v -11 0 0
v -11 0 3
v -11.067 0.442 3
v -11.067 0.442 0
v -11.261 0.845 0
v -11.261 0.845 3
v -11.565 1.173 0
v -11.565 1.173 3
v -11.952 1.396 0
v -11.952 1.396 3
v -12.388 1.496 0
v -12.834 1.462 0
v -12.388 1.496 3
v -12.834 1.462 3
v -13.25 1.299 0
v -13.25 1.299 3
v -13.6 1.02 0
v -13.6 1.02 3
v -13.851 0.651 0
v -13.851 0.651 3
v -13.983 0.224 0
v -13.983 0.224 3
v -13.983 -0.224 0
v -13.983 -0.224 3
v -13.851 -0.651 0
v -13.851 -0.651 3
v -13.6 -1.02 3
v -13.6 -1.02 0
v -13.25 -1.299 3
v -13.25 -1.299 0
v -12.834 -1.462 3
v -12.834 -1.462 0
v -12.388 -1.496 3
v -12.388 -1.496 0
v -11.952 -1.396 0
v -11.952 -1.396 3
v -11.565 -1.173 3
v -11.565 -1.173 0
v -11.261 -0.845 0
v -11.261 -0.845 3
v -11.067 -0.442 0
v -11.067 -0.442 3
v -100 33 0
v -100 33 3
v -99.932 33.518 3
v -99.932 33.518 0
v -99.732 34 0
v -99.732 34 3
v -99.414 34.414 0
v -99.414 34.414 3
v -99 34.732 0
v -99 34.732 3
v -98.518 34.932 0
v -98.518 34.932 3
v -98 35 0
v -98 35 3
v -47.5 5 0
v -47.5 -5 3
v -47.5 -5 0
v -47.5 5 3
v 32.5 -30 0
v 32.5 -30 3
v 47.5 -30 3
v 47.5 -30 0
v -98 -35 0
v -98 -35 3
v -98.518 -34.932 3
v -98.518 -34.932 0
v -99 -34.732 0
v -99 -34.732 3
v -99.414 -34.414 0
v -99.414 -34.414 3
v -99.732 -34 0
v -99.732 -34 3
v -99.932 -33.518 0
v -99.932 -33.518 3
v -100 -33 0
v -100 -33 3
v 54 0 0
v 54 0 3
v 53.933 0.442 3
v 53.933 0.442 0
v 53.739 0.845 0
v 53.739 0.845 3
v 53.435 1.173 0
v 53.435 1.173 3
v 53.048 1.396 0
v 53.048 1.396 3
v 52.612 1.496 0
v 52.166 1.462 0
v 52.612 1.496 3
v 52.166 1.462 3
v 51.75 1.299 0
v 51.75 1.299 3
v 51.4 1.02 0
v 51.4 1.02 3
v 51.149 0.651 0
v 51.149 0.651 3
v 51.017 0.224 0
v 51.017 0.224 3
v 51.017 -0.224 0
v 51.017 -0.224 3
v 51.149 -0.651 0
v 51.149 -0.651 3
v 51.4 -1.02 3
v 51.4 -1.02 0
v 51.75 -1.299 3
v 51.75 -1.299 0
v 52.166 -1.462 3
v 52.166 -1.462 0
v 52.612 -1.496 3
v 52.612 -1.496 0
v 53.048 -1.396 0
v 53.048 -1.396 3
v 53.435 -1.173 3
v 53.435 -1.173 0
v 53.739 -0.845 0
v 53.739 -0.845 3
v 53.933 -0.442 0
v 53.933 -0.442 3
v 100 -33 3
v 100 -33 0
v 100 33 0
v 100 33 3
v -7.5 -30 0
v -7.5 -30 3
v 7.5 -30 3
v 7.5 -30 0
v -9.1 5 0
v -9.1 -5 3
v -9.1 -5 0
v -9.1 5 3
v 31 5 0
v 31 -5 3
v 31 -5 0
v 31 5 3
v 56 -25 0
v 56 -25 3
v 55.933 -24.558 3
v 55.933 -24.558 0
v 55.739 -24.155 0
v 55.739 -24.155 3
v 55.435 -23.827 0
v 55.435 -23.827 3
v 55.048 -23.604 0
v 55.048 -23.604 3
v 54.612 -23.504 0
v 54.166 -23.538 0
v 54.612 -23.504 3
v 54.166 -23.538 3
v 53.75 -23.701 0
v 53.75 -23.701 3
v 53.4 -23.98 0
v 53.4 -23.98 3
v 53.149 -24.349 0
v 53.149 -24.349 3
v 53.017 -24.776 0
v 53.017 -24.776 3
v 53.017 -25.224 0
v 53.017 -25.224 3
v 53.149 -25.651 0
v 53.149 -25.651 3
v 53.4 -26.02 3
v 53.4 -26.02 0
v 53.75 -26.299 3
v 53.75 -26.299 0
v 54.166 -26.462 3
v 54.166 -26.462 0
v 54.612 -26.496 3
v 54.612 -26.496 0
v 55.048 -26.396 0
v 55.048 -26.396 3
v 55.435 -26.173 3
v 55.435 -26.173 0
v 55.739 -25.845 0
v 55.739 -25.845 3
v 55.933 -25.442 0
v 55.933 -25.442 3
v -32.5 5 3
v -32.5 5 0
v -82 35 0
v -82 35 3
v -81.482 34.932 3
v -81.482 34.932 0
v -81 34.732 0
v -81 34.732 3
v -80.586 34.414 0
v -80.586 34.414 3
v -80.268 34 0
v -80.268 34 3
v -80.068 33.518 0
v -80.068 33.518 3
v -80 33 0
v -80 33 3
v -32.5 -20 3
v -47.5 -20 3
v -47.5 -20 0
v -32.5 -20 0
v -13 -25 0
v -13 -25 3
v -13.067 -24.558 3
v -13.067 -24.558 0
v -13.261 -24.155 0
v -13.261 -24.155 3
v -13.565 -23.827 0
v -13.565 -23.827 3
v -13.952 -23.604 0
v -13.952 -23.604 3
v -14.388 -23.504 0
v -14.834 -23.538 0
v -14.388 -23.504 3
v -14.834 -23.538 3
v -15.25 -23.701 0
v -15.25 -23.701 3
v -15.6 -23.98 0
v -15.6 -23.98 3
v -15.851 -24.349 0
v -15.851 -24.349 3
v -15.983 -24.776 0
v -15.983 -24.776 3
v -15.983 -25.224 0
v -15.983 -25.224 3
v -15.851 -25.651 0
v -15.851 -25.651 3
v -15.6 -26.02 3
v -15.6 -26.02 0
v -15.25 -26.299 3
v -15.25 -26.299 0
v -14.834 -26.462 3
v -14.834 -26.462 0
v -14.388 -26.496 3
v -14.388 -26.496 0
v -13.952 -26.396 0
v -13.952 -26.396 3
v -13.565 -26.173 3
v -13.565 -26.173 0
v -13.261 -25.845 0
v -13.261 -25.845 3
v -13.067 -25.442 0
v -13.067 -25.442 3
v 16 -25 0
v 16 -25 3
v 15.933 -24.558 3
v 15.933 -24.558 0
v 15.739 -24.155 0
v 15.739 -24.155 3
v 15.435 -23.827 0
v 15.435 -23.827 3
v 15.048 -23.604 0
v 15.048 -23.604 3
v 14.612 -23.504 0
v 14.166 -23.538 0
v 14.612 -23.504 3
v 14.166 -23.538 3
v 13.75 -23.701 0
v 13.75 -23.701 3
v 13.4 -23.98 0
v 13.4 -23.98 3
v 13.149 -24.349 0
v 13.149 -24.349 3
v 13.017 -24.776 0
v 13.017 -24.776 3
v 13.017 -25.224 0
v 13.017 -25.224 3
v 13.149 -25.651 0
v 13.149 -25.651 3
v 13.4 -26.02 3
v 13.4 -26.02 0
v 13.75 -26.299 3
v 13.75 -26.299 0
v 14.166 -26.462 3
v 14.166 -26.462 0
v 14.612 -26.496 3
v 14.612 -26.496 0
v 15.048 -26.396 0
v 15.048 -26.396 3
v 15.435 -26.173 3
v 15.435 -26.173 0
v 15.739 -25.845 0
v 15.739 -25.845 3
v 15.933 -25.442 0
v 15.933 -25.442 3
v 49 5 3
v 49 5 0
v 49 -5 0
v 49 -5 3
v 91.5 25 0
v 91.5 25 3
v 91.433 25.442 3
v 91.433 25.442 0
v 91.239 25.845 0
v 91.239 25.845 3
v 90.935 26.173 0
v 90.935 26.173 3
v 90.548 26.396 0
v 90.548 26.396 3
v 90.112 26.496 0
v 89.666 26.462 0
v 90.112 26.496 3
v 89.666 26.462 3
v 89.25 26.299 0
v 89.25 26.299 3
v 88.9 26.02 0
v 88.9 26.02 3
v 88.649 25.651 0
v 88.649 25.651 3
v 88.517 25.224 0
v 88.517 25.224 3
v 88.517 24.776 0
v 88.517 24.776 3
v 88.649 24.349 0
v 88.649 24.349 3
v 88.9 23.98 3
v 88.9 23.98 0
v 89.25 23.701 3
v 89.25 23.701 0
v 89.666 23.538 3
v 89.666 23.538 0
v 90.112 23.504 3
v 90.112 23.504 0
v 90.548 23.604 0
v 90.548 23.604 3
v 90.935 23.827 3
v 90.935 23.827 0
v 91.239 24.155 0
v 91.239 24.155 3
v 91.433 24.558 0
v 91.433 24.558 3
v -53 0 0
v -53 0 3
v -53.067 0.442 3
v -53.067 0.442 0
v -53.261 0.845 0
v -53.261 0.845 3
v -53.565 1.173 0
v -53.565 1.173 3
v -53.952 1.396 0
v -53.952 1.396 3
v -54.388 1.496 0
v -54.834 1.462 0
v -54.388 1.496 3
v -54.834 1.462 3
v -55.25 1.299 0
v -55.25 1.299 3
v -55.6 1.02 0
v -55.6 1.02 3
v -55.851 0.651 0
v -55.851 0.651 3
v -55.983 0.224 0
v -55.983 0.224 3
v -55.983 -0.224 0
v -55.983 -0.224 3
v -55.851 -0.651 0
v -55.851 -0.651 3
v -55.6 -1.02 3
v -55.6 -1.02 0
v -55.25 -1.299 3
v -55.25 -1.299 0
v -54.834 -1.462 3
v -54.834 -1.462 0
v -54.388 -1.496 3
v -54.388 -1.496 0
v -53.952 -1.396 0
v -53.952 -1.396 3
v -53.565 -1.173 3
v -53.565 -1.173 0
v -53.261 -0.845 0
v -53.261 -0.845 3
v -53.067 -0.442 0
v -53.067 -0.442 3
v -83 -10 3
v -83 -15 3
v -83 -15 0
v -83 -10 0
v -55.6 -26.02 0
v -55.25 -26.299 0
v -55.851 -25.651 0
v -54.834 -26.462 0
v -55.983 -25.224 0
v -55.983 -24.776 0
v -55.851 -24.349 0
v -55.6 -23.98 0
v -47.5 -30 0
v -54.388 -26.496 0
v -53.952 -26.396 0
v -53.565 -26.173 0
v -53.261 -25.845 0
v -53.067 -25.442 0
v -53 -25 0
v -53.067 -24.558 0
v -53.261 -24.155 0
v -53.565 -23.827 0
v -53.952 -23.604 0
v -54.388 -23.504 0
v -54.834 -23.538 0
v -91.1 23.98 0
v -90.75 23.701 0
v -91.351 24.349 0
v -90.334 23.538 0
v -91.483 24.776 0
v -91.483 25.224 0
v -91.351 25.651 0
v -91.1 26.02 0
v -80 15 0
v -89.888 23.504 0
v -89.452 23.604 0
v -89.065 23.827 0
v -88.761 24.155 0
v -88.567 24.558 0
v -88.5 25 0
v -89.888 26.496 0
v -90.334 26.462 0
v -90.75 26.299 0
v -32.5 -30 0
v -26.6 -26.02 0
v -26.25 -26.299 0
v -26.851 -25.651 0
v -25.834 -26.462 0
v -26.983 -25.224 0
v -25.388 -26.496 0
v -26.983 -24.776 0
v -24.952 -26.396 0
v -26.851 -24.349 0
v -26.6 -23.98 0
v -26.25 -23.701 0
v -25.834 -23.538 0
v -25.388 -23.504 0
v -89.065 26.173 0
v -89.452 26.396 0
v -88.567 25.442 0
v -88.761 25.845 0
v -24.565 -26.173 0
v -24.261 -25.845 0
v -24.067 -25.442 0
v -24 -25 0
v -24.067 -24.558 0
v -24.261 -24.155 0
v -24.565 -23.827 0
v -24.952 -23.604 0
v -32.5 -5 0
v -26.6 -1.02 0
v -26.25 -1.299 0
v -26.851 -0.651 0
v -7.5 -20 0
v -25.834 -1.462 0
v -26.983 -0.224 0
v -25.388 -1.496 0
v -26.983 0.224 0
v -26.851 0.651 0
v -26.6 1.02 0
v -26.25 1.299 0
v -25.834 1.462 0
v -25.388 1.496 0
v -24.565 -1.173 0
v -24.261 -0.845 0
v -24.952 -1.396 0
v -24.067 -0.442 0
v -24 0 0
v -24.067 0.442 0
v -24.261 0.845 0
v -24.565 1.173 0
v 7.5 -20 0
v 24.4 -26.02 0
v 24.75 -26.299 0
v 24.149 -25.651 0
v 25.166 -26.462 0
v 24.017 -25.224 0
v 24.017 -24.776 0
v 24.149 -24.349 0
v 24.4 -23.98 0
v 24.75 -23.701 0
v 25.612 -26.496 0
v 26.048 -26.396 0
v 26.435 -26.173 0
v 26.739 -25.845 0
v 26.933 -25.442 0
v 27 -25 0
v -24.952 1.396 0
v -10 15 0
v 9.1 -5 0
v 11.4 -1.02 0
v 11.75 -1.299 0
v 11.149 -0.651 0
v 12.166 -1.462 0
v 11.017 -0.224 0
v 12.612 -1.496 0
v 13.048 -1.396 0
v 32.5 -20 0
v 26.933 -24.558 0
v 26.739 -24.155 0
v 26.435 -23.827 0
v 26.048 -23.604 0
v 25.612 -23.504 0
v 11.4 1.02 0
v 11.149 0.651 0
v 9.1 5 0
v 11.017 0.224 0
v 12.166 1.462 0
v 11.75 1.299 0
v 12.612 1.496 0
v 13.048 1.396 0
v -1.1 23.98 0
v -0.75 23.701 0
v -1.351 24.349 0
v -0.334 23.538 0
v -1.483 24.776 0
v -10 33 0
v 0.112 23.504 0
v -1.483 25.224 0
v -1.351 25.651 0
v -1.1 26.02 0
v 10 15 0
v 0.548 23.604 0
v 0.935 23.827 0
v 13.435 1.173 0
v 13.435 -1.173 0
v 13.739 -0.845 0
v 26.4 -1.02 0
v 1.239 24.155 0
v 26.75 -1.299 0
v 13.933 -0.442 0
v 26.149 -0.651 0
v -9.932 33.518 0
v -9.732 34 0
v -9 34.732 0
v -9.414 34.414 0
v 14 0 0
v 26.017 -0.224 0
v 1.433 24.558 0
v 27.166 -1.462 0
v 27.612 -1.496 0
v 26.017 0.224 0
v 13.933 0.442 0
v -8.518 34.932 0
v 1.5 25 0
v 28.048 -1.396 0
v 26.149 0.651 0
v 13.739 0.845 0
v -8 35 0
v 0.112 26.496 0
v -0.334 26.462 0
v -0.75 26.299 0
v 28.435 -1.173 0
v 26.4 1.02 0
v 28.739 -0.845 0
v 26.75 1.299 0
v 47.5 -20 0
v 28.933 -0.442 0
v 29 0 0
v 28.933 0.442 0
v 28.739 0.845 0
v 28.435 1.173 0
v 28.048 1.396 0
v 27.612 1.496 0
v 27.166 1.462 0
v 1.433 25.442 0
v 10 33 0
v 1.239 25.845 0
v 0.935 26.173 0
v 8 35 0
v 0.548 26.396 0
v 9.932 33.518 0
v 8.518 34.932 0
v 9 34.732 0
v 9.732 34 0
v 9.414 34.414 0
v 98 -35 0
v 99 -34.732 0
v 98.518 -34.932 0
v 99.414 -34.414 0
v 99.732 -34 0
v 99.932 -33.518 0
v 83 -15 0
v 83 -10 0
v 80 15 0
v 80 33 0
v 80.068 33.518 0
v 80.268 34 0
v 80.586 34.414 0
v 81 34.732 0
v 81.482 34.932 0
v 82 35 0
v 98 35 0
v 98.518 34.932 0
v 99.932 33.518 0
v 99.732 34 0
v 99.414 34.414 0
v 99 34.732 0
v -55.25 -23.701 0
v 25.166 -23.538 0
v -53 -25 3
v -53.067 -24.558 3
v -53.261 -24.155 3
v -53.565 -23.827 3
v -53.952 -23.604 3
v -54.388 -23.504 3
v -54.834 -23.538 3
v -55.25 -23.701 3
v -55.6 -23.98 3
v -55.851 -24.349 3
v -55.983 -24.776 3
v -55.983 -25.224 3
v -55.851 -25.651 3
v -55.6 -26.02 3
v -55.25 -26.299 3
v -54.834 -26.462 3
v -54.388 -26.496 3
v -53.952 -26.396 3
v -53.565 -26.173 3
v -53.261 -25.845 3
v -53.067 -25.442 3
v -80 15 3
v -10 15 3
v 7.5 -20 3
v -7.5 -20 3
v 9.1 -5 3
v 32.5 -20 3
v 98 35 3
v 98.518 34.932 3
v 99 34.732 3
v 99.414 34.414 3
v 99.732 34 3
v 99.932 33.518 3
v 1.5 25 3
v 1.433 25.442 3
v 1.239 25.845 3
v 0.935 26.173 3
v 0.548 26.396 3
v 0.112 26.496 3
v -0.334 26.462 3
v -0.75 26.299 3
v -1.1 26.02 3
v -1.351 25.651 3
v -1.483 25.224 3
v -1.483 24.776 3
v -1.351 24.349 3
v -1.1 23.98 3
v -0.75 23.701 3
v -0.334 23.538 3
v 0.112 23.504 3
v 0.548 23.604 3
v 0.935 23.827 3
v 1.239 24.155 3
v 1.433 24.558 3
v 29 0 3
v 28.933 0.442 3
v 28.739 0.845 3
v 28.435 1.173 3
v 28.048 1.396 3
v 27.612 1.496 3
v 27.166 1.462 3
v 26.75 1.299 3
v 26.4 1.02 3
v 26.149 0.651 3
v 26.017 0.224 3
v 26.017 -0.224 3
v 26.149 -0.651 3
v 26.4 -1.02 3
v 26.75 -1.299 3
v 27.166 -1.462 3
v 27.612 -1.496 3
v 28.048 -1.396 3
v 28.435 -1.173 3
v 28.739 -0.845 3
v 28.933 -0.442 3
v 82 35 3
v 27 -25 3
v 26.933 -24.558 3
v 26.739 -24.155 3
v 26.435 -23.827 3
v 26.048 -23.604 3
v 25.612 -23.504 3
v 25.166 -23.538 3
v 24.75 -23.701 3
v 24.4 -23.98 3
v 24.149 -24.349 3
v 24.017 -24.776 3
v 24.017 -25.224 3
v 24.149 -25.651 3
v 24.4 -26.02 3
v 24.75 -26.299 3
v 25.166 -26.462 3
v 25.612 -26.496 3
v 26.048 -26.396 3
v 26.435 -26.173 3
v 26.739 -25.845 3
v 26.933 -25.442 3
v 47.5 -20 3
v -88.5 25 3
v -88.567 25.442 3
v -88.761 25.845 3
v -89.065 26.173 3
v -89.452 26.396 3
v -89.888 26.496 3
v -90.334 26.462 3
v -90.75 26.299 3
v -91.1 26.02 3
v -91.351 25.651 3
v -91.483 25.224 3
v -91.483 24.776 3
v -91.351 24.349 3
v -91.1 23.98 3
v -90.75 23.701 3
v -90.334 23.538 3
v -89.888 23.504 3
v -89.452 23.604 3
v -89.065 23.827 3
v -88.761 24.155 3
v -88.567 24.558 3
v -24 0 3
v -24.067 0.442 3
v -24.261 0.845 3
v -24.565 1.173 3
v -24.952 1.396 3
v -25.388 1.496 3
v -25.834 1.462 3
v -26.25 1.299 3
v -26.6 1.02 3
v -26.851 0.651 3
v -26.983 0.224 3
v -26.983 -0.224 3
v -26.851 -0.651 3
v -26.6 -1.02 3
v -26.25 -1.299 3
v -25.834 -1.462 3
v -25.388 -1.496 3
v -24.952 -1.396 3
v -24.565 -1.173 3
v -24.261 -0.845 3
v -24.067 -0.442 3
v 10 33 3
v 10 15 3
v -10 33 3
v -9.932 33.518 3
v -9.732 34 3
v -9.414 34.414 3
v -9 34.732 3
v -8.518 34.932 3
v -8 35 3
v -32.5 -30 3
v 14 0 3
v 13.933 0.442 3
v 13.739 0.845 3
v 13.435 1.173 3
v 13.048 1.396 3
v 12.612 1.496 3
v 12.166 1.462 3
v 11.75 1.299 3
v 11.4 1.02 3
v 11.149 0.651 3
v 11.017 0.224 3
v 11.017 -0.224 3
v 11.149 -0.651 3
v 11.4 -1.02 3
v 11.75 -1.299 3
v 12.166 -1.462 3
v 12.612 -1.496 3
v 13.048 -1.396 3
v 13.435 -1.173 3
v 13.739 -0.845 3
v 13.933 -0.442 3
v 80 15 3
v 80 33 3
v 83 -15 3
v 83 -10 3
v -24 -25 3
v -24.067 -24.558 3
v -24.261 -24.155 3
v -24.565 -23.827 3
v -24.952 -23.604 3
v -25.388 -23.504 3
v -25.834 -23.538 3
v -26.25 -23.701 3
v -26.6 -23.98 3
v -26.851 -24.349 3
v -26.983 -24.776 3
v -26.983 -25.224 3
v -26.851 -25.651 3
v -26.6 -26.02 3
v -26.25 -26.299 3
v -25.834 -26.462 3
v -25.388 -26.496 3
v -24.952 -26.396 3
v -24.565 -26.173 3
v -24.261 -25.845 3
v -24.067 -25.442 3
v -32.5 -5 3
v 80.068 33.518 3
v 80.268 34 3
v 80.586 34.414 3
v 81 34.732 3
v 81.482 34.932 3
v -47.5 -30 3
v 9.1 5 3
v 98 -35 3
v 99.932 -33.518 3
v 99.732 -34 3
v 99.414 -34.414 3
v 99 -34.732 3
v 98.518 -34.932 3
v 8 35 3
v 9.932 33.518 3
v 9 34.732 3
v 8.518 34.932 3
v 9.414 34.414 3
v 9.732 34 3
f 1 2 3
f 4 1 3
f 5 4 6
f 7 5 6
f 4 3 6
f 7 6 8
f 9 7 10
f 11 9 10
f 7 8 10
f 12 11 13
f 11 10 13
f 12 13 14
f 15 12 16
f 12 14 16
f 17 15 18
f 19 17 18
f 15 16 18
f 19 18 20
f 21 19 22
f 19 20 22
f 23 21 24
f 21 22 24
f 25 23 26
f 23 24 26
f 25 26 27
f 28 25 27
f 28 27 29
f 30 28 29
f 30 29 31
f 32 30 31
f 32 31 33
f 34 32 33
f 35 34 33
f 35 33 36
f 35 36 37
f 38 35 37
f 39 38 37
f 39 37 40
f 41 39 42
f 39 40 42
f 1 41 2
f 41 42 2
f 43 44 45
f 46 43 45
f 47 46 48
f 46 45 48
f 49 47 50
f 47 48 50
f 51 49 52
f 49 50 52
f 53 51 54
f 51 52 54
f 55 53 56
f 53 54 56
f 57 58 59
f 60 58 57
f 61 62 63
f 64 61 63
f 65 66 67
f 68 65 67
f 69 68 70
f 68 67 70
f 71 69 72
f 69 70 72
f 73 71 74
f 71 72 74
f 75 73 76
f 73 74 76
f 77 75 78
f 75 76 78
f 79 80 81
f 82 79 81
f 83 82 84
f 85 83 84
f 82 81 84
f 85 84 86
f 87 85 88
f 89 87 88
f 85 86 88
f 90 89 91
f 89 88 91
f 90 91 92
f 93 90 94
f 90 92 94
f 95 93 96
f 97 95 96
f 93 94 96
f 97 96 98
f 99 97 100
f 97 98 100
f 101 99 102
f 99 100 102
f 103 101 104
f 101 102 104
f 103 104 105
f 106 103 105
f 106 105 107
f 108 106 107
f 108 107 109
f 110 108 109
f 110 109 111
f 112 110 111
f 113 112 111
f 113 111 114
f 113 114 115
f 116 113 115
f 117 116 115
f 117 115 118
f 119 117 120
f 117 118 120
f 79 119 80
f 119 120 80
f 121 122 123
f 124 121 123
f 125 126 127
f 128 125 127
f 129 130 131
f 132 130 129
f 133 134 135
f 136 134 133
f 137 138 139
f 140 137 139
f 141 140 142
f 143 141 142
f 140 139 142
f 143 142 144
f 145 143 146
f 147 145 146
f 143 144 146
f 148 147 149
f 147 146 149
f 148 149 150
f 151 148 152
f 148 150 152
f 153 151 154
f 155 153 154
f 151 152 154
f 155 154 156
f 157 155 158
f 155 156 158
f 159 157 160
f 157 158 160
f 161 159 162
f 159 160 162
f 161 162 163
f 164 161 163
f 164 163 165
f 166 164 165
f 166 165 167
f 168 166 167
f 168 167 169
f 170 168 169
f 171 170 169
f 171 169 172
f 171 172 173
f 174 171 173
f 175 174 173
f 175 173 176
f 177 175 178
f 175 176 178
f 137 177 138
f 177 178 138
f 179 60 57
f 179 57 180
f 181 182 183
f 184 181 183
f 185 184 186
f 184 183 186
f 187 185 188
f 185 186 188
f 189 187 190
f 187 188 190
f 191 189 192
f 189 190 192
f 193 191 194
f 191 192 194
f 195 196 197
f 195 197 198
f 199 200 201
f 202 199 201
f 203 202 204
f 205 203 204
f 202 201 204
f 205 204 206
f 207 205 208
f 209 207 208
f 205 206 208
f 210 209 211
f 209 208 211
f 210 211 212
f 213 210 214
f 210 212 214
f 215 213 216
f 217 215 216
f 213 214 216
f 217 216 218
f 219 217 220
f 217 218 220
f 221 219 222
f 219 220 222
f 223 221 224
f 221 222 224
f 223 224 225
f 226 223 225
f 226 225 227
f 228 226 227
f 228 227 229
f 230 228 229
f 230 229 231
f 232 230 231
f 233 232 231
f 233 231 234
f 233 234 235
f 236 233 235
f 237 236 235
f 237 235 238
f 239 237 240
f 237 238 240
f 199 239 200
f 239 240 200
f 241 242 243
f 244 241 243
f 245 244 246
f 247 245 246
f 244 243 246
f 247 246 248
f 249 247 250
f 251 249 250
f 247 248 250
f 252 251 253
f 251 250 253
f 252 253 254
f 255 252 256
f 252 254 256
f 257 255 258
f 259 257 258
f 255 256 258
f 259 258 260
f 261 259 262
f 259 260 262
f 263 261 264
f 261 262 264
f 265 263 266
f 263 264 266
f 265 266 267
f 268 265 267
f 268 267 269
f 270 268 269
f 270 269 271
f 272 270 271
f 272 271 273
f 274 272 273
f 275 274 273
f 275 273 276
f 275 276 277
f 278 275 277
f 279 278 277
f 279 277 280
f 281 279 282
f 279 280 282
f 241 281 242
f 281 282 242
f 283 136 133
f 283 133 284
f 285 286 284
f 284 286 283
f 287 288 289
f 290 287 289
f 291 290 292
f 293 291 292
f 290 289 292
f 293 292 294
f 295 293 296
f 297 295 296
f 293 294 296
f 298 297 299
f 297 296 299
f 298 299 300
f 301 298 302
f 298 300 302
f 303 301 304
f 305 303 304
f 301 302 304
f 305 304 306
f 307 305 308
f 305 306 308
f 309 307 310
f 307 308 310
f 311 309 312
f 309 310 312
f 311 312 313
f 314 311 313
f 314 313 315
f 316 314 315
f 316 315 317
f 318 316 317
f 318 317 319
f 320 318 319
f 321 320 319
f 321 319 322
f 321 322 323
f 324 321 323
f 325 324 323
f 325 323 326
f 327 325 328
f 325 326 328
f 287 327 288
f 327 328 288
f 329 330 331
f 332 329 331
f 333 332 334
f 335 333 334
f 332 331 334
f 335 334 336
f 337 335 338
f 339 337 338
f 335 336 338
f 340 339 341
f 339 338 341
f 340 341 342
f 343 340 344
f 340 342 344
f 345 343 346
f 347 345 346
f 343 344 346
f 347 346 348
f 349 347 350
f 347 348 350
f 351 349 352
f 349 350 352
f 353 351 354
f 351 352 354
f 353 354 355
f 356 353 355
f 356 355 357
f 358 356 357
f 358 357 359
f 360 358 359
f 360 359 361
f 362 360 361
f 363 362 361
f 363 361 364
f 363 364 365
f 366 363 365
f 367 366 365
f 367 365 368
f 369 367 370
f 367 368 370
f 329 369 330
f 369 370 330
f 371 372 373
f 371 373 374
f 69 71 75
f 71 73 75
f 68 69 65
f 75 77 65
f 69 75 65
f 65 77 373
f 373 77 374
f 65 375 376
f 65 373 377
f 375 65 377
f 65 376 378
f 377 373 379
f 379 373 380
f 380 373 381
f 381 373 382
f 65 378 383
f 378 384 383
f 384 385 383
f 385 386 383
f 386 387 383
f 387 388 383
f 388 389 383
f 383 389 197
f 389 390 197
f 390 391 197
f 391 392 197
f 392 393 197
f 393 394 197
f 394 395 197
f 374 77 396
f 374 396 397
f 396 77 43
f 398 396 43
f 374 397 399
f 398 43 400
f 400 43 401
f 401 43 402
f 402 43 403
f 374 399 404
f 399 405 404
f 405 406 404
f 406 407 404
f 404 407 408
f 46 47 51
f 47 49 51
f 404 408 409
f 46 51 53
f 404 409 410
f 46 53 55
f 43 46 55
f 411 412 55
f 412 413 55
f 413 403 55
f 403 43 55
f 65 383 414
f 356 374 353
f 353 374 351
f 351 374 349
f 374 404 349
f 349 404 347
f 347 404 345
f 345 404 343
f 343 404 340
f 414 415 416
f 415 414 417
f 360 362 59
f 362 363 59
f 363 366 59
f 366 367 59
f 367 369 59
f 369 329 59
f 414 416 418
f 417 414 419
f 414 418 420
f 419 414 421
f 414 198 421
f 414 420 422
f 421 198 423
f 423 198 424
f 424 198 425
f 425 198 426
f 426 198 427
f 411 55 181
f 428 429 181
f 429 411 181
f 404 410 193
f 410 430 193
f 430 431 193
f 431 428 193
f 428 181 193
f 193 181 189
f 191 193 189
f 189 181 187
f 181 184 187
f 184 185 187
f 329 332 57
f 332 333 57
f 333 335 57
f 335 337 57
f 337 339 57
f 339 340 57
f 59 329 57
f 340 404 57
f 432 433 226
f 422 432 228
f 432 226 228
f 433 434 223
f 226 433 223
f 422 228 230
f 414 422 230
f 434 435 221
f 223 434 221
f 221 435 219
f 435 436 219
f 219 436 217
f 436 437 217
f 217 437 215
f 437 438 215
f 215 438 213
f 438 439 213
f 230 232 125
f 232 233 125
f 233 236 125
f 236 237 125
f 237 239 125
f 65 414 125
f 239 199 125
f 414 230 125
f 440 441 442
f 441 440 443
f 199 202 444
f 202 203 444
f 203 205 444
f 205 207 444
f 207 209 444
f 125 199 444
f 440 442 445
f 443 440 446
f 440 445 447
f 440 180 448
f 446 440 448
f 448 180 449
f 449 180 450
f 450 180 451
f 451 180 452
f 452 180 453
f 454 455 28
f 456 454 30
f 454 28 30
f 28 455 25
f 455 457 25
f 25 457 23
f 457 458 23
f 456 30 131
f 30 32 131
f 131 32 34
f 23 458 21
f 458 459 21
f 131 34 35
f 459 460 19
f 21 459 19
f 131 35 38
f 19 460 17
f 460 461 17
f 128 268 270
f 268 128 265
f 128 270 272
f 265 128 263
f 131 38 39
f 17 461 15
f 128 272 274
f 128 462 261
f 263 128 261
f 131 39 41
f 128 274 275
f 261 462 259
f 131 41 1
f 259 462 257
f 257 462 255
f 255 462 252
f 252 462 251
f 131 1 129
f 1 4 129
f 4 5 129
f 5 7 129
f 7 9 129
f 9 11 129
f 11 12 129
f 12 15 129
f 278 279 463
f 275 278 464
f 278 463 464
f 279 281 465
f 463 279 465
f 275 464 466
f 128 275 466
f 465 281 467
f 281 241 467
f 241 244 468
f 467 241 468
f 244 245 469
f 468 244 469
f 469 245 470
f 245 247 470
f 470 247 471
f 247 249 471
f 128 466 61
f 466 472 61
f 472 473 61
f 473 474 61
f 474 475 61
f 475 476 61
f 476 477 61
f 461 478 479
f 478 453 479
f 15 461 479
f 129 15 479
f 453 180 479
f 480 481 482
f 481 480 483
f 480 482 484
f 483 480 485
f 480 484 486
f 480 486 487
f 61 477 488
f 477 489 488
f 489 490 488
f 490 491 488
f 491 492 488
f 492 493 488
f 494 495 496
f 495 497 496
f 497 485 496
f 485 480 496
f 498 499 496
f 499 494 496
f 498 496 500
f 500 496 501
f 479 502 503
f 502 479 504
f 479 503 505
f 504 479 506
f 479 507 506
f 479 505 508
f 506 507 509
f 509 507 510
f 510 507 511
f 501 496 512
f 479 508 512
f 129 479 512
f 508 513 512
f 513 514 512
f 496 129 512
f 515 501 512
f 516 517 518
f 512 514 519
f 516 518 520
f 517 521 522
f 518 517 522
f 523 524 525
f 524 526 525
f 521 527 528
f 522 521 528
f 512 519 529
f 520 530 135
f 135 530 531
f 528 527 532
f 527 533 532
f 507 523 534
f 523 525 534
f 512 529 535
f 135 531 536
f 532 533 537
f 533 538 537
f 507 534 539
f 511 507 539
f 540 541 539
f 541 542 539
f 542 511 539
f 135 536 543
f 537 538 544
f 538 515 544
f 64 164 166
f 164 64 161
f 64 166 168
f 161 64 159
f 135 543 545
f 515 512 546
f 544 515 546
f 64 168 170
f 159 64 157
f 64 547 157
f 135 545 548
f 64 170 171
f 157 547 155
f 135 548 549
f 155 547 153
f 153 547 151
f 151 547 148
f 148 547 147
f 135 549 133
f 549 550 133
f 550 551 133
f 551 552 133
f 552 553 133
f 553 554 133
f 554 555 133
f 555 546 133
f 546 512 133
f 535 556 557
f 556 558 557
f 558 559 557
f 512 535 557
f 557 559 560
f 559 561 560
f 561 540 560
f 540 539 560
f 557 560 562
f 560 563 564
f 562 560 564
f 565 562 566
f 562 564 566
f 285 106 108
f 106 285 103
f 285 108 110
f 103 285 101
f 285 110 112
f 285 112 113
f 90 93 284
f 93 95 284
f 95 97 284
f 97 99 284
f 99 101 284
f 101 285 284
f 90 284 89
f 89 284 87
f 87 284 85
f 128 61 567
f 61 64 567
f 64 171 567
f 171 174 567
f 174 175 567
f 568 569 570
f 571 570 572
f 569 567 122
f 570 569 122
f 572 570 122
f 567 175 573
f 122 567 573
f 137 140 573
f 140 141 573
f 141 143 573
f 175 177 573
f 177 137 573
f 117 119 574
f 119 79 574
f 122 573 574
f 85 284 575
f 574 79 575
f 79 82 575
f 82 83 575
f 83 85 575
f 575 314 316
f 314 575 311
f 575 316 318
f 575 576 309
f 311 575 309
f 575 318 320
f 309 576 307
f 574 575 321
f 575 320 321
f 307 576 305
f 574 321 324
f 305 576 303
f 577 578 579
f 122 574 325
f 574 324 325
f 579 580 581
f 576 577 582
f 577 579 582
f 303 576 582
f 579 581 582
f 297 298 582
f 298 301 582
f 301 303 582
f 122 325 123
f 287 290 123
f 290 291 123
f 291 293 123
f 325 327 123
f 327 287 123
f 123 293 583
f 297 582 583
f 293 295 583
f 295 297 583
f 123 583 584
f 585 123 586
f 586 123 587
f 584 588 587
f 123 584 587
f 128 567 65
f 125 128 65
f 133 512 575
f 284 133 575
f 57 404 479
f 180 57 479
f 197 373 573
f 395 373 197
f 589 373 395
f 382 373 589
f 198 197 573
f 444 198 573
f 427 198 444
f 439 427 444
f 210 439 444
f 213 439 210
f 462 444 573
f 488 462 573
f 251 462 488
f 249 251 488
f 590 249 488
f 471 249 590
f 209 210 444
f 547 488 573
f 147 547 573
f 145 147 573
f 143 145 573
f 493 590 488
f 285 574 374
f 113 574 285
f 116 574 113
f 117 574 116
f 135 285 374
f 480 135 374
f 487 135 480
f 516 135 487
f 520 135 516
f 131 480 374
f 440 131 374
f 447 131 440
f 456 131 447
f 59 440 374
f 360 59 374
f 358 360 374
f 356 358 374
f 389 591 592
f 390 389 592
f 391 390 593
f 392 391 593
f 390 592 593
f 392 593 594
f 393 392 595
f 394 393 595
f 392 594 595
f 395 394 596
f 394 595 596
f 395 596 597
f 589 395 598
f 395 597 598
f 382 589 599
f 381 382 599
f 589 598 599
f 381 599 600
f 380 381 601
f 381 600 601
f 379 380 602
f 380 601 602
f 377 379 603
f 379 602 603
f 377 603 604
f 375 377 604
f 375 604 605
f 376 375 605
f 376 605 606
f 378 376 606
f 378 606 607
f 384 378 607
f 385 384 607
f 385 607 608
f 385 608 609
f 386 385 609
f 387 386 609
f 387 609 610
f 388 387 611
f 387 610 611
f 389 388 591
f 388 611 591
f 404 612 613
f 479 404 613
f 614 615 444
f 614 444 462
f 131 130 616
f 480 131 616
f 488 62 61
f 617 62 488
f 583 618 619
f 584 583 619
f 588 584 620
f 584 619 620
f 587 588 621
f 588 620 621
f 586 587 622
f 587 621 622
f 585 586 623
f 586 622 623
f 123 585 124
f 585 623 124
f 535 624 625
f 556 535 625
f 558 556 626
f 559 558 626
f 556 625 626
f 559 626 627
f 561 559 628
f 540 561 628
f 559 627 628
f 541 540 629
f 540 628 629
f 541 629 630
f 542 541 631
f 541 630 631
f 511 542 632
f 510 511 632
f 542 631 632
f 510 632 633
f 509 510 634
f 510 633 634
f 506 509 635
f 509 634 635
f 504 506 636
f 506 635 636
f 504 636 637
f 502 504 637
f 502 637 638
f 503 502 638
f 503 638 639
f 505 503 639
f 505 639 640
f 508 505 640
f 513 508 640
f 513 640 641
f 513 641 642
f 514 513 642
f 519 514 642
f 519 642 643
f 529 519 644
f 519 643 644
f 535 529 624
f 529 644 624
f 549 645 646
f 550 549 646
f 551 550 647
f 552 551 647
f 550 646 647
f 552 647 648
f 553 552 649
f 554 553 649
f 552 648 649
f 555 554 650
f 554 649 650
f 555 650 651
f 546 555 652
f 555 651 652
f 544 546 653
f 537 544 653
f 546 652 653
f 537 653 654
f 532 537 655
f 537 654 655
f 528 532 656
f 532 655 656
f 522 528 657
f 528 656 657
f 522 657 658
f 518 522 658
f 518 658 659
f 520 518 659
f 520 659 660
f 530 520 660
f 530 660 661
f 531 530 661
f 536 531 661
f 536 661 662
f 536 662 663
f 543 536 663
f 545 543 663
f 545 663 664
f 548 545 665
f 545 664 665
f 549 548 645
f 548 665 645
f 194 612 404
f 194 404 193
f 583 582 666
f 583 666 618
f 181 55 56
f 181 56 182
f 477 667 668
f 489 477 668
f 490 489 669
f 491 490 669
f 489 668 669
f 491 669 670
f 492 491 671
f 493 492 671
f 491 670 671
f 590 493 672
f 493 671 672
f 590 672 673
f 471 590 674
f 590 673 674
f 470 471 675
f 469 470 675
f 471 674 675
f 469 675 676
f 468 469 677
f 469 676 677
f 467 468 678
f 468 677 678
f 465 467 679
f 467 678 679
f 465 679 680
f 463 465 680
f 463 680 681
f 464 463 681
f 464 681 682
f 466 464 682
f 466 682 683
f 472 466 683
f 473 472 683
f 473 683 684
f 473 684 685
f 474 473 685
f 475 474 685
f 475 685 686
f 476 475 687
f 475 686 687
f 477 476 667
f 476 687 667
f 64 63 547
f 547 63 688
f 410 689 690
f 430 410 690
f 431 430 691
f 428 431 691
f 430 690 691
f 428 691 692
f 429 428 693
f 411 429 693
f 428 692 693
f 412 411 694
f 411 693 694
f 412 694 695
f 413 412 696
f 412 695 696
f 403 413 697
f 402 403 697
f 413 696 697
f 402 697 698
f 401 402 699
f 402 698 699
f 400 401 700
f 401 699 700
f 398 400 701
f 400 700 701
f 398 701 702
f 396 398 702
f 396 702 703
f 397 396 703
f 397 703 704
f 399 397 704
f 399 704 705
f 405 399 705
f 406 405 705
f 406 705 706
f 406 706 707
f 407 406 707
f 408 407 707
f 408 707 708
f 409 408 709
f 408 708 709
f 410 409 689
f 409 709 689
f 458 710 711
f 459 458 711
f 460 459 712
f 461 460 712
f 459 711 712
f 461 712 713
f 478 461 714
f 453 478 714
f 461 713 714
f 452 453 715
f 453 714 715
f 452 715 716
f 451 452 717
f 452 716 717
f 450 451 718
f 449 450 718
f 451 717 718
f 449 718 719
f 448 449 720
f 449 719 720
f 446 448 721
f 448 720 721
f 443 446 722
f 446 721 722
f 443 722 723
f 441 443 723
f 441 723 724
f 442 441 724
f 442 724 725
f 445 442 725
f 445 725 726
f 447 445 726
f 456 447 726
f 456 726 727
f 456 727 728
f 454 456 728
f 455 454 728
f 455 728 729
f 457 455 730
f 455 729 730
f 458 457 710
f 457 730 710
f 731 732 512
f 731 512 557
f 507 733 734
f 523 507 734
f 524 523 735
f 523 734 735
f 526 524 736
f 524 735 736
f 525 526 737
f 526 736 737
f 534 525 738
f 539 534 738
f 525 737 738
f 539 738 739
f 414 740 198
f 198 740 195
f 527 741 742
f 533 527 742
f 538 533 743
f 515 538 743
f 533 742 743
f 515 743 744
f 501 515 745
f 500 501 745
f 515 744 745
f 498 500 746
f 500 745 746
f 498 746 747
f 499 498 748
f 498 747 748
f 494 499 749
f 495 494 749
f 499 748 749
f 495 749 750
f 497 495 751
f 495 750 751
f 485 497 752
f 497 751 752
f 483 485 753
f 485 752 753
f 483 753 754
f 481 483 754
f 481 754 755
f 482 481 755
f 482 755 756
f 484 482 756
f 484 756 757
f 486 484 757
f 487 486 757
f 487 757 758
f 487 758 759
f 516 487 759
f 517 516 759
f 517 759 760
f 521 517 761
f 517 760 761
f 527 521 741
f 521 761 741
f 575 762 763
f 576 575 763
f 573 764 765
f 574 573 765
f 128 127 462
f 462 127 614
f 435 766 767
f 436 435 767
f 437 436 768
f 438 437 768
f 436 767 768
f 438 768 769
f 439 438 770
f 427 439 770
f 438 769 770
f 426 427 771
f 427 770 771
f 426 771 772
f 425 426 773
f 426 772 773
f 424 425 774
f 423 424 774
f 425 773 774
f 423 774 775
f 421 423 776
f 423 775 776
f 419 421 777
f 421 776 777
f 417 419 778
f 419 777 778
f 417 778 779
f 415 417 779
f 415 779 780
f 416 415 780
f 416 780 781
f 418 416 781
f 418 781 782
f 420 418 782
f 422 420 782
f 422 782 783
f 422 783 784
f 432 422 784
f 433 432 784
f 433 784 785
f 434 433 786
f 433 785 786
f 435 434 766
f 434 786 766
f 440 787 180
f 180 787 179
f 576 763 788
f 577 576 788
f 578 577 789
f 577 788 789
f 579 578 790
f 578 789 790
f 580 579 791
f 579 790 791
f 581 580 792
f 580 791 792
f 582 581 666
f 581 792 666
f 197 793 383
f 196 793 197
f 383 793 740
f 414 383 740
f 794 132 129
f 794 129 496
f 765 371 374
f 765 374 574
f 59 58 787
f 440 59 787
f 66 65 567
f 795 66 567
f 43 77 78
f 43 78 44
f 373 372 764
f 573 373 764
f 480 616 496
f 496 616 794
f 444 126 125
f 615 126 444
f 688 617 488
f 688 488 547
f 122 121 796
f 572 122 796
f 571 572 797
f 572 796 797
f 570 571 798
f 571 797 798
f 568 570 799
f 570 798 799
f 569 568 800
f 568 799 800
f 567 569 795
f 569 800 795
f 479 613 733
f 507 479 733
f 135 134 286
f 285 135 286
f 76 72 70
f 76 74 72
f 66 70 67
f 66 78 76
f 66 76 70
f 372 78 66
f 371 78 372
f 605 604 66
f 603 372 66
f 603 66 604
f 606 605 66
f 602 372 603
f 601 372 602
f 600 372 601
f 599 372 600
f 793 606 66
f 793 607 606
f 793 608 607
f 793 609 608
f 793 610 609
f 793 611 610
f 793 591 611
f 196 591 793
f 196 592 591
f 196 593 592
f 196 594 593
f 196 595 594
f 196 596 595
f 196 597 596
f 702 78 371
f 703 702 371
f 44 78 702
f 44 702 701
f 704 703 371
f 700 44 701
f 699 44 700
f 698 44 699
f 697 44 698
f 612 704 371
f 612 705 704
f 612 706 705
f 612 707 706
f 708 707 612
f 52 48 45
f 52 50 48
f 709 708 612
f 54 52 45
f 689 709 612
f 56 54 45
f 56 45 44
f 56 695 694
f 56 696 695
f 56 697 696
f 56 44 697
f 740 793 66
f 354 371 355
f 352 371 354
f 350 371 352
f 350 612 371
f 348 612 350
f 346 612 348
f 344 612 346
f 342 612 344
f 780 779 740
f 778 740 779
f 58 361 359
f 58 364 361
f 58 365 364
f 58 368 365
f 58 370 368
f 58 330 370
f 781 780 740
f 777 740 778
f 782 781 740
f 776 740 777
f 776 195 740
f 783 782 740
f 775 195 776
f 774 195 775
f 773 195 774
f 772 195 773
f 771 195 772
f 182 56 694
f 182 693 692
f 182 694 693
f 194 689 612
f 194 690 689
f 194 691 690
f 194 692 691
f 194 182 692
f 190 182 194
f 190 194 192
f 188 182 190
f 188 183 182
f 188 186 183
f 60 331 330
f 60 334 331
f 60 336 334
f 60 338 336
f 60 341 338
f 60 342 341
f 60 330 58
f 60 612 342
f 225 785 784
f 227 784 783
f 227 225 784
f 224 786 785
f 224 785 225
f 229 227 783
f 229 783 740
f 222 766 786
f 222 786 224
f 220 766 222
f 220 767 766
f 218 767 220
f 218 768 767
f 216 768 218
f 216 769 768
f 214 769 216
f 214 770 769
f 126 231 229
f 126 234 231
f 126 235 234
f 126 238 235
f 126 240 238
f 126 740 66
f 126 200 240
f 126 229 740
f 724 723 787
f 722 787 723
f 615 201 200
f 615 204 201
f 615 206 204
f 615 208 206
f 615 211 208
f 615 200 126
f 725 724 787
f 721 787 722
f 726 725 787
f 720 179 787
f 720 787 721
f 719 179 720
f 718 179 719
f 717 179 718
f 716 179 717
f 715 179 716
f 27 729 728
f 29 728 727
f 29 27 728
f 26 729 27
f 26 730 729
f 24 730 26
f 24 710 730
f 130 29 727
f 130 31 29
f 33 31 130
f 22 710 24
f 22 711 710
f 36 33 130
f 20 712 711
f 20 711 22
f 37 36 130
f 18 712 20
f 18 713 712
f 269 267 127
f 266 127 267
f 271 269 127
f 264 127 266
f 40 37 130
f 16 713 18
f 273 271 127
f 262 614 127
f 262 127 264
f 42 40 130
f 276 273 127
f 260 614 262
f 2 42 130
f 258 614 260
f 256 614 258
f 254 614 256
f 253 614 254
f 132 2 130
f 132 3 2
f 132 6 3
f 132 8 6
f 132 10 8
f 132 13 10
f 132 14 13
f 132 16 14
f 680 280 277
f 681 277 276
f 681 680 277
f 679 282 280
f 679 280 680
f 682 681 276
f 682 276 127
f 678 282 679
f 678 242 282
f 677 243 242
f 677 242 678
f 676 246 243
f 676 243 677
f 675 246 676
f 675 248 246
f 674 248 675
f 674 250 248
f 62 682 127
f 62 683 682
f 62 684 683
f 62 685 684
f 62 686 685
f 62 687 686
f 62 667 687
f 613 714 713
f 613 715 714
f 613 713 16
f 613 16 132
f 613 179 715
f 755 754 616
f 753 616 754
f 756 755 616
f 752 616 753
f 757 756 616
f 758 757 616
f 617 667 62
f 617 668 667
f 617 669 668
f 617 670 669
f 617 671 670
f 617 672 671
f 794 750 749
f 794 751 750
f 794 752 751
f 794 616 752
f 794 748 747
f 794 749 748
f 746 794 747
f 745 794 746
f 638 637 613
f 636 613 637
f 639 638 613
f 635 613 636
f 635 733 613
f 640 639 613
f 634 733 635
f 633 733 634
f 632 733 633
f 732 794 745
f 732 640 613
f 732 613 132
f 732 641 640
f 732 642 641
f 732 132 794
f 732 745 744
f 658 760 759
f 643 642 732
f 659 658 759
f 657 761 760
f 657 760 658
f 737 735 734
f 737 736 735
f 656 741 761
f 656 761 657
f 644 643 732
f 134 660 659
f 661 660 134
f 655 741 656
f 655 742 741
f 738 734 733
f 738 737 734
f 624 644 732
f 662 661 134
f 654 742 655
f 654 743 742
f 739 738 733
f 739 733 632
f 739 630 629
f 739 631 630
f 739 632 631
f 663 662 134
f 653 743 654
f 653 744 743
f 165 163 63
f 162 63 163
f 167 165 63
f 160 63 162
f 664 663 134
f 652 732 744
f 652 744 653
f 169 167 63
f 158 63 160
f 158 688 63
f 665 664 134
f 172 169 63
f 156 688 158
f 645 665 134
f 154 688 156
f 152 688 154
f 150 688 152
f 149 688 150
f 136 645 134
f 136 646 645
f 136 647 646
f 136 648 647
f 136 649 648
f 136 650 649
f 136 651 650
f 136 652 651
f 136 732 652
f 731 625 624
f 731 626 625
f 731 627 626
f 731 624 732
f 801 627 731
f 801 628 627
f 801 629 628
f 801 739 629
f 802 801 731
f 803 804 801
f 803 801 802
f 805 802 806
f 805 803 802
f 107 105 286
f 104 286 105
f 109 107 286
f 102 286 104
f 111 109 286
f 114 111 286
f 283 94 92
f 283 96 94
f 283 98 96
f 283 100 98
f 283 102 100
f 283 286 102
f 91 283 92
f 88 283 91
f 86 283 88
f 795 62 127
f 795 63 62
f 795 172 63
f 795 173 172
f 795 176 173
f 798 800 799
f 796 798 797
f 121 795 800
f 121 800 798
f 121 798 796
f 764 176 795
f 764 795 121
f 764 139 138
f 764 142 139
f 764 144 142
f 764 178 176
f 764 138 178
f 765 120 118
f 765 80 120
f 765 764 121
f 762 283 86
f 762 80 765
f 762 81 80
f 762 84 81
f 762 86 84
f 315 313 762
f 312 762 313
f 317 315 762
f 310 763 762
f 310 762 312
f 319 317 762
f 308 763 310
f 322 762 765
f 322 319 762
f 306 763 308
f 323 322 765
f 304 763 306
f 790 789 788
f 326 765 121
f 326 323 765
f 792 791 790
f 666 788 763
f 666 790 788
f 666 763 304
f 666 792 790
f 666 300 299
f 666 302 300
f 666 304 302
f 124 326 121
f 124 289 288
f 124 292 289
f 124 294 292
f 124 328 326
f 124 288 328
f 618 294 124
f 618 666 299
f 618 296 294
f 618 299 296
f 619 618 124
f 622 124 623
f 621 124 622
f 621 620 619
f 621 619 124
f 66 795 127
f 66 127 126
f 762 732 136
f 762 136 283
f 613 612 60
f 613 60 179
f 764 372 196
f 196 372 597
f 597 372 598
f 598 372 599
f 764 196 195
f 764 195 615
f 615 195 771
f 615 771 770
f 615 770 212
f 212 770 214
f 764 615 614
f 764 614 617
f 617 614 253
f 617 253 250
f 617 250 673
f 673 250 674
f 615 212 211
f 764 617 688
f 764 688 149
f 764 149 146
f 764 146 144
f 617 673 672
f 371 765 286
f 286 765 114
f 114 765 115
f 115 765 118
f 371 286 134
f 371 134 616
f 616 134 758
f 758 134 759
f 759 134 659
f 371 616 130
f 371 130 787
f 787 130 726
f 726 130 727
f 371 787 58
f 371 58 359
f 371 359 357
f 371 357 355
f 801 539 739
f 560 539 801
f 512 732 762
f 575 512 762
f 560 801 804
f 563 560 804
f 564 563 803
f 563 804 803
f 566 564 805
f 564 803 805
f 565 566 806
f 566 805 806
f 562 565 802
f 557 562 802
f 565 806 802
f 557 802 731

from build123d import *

# Parameters (mm, degrees)
SKETCH_1_W           = 200
SKETCH_1_H           = 70
EXTRUDE_1_DEPTH      = 3
SKETCH_2_W           = 70
SKETCH_2_H           = 20
CUT_EXTRUDE_1_DEPTH  = 3
SKETCH_4_W           = 70
SKETCH_4_H           = 20
CUT_EXTRUDE_2_DEPTH  = 3
SKETCH_5_W           = 166
SKETCH_5_H           = 5
CUT_EXTRUDE_3_DEPTH  = 3
CUT_EXTRUDE_8_DEPTH  = 3
SKETCH_7_R           = 1.5
CUT_EXTRUDE_9_DEPTH  = 3
SKETCH_8_W           = 15
SKETCH_8_H           = 10
CUT_EXTRUDE_10_DEPTH = 3
SKETCH_9_W           = 15
SKETCH_9_H           = 10
SKETCH_9_W_2         = 18
SKETCH_9_W_3         = 18.2
CUT_EXTRUDE_11_DEPTH = 3
SKETCH_10_R          = 1.5
CUT_EXTRUDE_12_DEPTH = 3


with BuildPart() as part:
    # ｽｹｯﾁ1 → ﾎﾞｽ - 押し出し1 (new body)
    with BuildSketch(Plane.XY):
        Rectangle(SKETCH_1_W, SKETCH_1_H)
    extrude(amount=EXTRUDE_1_DEPTH)

    # ｽｹｯﾁ2 → ｶｯﾄ - 押し出し1 (cut)
    with BuildSketch(Plane.XY.offset(3)):
        with Locations((-45, 25)):
            Rectangle(SKETCH_2_W, SKETCH_2_H)
    extrude(amount=-CUT_EXTRUDE_1_DEPTH, mode=Mode.SUBTRACT)

    # ｽｹｯﾁ4 → ｶｯﾄ - 押し出し2 (cut)
    with BuildSketch(Plane.XY.offset(3)):
        with Locations((45, 25)):
            Rectangle(SKETCH_4_W, SKETCH_4_H)
    extrude(amount=-CUT_EXTRUDE_2_DEPTH, mode=Mode.SUBTRACT)

    # ｽｹｯﾁ5 → ｶｯﾄ - 押し出し3 (cut)
    with BuildSketch(Plane.XY.offset(3)):
        with Locations((0, -12.5)):
            Rectangle(SKETCH_5_W, SKETCH_5_H)
    extrude(amount=-CUT_EXTRUDE_3_DEPTH, mode=Mode.SUBTRACT)

    # ｽｹｯﾁ6 → ｶｯﾄ - 押し出し8 (cut)
    with BuildSketch(Plane.XY.offset(3)):
        with BuildLine():
            ThreePointArc((-98, -35), (-99.414213562, -34.414213562), (-100, -33))
            Line((-100, -33), (-100, -35))
            Line((-100, -35), (-98, -35))
        make_face()
        with BuildLine():
            Line((-100, 35), (-100, 33))
            ThreePointArc((-100, 33), (-99.414213562, 34.414213562), (-98, 35))
            Line((-98, 35), (-100, 35))
        make_face()
        with BuildLine():
            ThreePointArc((100, -33), (99.414213562, -34.414213562), (98, -35))
            Line((98, -35), (100, -35))
            Line((100, -35), (100, -33))
        make_face()
        with BuildLine():
            Line((-80, 35), (-82, 35))
            ThreePointArc((-82, 35), (-80.585786438, 34.414213562), (-80, 33))
            Line((-80, 33), (-80, 35))
        make_face()
        with BuildLine():
            ThreePointArc((98, 35), (99.414213562, 34.414213562), (100, 33))
            Line((100, 33), (100, 35))
            Line((100, 35), (98, 35))
        make_face()
        with BuildLine():
            ThreePointArc((80, 33), (80.585786438, 34.414213562), (82, 35))
            Line((82, 35), (80, 35))
            Line((80, 35), (80, 33))
        make_face()
        with BuildLine():
            Line((-10, 35), (-10, 33))
            ThreePointArc((-10, 33), (-9.414213562, 34.414213562), (-8, 35))
            Line((-8, 35), (-10, 35))
        make_face()
        with BuildLine():
            Line((10, 35), (8, 35))
            ThreePointArc((8, 35), (9.414213562, 34.414213562), (10, 33))
            Line((10, 33), (10, 35))
        make_face()
    extrude(amount=-CUT_EXTRUDE_8_DEPTH, mode=Mode.SUBTRACT)

    # ｽｹｯﾁ7 → ｶｯﾄ - 押し出し9 (cut)
    with BuildSketch(Plane.XY.offset(3)):
        with Locations((-90, 25)):
            Circle(SKETCH_7_R)
        with Locations((0, 25)):
            Circle(SKETCH_7_R)
        with Locations((90, 25)):
            Circle(SKETCH_7_R)
    extrude(amount=-CUT_EXTRUDE_9_DEPTH, mode=Mode.SUBTRACT)

    # ｽｹｯﾁ8 → ｶｯﾄ - 押し出し10 (cut)
    with BuildSketch(Plane.XY.offset(3)):
        with Locations((40, -25)):
            Rectangle(SKETCH_8_W, SKETCH_8_H)
        with Locations((0, -25)):
            Rectangle(SKETCH_8_W, SKETCH_8_H)
        with Locations((-40, -25)):
            Rectangle(SKETCH_8_W, SKETCH_8_H)
    extrude(amount=-CUT_EXTRUDE_10_DEPTH, mode=Mode.SUBTRACT)

    # ｽｹｯﾁ9 → ｶｯﾄ - 押し出し11 (cut)
    with BuildSketch(Plane.XY.offset(3)):
        with Locations((-40, 0)):
            Rectangle(SKETCH_9_W, SKETCH_9_H)
        with Locations((40, 0)):
            Rectangle(SKETCH_9_W_2, SKETCH_9_H)
        Rectangle(SKETCH_9_W_3, SKETCH_9_H)
    extrude(amount=-CUT_EXTRUDE_11_DEPTH, mode=Mode.SUBTRACT)

    # ｽｹｯﾁ10 → ｶｯﾄ - 押し出し12 (cut)
    with BuildSketch(Plane.XY.offset(3)):
        with Locations((-54.5, 0)):
            Circle(SKETCH_10_R)
        with Locations((-25.5, 0)):
            Circle(SKETCH_10_R)
        with Locations((-12.5, 0)):
            Circle(SKETCH_10_R)
        with Locations((12.5, 0)):
            Circle(SKETCH_10_R)
        with Locations((27.5, 0)):
            Circle(SKETCH_10_R)
        with Locations((52.5, 0)):
            Circle(SKETCH_10_R)
        with Locations((54.5, -25)):
            Circle(SKETCH_10_R)
        with Locations((25.5, -25)):
            Circle(SKETCH_10_R)
        with Locations((14.5, -25)):
            Circle(SKETCH_10_R)
        with Locations((-14.5, -25)):
            Circle(SKETCH_10_R)
        with Locations((-25.5, -25)):
            Circle(SKETCH_10_R)
        with Locations((-54.5, -25)):
            Circle(SKETCH_10_R)
    extrude(amount=-CUT_EXTRUDE_12_DEPTH, mode=Mode.SUBTRACT)


solid = part.part
